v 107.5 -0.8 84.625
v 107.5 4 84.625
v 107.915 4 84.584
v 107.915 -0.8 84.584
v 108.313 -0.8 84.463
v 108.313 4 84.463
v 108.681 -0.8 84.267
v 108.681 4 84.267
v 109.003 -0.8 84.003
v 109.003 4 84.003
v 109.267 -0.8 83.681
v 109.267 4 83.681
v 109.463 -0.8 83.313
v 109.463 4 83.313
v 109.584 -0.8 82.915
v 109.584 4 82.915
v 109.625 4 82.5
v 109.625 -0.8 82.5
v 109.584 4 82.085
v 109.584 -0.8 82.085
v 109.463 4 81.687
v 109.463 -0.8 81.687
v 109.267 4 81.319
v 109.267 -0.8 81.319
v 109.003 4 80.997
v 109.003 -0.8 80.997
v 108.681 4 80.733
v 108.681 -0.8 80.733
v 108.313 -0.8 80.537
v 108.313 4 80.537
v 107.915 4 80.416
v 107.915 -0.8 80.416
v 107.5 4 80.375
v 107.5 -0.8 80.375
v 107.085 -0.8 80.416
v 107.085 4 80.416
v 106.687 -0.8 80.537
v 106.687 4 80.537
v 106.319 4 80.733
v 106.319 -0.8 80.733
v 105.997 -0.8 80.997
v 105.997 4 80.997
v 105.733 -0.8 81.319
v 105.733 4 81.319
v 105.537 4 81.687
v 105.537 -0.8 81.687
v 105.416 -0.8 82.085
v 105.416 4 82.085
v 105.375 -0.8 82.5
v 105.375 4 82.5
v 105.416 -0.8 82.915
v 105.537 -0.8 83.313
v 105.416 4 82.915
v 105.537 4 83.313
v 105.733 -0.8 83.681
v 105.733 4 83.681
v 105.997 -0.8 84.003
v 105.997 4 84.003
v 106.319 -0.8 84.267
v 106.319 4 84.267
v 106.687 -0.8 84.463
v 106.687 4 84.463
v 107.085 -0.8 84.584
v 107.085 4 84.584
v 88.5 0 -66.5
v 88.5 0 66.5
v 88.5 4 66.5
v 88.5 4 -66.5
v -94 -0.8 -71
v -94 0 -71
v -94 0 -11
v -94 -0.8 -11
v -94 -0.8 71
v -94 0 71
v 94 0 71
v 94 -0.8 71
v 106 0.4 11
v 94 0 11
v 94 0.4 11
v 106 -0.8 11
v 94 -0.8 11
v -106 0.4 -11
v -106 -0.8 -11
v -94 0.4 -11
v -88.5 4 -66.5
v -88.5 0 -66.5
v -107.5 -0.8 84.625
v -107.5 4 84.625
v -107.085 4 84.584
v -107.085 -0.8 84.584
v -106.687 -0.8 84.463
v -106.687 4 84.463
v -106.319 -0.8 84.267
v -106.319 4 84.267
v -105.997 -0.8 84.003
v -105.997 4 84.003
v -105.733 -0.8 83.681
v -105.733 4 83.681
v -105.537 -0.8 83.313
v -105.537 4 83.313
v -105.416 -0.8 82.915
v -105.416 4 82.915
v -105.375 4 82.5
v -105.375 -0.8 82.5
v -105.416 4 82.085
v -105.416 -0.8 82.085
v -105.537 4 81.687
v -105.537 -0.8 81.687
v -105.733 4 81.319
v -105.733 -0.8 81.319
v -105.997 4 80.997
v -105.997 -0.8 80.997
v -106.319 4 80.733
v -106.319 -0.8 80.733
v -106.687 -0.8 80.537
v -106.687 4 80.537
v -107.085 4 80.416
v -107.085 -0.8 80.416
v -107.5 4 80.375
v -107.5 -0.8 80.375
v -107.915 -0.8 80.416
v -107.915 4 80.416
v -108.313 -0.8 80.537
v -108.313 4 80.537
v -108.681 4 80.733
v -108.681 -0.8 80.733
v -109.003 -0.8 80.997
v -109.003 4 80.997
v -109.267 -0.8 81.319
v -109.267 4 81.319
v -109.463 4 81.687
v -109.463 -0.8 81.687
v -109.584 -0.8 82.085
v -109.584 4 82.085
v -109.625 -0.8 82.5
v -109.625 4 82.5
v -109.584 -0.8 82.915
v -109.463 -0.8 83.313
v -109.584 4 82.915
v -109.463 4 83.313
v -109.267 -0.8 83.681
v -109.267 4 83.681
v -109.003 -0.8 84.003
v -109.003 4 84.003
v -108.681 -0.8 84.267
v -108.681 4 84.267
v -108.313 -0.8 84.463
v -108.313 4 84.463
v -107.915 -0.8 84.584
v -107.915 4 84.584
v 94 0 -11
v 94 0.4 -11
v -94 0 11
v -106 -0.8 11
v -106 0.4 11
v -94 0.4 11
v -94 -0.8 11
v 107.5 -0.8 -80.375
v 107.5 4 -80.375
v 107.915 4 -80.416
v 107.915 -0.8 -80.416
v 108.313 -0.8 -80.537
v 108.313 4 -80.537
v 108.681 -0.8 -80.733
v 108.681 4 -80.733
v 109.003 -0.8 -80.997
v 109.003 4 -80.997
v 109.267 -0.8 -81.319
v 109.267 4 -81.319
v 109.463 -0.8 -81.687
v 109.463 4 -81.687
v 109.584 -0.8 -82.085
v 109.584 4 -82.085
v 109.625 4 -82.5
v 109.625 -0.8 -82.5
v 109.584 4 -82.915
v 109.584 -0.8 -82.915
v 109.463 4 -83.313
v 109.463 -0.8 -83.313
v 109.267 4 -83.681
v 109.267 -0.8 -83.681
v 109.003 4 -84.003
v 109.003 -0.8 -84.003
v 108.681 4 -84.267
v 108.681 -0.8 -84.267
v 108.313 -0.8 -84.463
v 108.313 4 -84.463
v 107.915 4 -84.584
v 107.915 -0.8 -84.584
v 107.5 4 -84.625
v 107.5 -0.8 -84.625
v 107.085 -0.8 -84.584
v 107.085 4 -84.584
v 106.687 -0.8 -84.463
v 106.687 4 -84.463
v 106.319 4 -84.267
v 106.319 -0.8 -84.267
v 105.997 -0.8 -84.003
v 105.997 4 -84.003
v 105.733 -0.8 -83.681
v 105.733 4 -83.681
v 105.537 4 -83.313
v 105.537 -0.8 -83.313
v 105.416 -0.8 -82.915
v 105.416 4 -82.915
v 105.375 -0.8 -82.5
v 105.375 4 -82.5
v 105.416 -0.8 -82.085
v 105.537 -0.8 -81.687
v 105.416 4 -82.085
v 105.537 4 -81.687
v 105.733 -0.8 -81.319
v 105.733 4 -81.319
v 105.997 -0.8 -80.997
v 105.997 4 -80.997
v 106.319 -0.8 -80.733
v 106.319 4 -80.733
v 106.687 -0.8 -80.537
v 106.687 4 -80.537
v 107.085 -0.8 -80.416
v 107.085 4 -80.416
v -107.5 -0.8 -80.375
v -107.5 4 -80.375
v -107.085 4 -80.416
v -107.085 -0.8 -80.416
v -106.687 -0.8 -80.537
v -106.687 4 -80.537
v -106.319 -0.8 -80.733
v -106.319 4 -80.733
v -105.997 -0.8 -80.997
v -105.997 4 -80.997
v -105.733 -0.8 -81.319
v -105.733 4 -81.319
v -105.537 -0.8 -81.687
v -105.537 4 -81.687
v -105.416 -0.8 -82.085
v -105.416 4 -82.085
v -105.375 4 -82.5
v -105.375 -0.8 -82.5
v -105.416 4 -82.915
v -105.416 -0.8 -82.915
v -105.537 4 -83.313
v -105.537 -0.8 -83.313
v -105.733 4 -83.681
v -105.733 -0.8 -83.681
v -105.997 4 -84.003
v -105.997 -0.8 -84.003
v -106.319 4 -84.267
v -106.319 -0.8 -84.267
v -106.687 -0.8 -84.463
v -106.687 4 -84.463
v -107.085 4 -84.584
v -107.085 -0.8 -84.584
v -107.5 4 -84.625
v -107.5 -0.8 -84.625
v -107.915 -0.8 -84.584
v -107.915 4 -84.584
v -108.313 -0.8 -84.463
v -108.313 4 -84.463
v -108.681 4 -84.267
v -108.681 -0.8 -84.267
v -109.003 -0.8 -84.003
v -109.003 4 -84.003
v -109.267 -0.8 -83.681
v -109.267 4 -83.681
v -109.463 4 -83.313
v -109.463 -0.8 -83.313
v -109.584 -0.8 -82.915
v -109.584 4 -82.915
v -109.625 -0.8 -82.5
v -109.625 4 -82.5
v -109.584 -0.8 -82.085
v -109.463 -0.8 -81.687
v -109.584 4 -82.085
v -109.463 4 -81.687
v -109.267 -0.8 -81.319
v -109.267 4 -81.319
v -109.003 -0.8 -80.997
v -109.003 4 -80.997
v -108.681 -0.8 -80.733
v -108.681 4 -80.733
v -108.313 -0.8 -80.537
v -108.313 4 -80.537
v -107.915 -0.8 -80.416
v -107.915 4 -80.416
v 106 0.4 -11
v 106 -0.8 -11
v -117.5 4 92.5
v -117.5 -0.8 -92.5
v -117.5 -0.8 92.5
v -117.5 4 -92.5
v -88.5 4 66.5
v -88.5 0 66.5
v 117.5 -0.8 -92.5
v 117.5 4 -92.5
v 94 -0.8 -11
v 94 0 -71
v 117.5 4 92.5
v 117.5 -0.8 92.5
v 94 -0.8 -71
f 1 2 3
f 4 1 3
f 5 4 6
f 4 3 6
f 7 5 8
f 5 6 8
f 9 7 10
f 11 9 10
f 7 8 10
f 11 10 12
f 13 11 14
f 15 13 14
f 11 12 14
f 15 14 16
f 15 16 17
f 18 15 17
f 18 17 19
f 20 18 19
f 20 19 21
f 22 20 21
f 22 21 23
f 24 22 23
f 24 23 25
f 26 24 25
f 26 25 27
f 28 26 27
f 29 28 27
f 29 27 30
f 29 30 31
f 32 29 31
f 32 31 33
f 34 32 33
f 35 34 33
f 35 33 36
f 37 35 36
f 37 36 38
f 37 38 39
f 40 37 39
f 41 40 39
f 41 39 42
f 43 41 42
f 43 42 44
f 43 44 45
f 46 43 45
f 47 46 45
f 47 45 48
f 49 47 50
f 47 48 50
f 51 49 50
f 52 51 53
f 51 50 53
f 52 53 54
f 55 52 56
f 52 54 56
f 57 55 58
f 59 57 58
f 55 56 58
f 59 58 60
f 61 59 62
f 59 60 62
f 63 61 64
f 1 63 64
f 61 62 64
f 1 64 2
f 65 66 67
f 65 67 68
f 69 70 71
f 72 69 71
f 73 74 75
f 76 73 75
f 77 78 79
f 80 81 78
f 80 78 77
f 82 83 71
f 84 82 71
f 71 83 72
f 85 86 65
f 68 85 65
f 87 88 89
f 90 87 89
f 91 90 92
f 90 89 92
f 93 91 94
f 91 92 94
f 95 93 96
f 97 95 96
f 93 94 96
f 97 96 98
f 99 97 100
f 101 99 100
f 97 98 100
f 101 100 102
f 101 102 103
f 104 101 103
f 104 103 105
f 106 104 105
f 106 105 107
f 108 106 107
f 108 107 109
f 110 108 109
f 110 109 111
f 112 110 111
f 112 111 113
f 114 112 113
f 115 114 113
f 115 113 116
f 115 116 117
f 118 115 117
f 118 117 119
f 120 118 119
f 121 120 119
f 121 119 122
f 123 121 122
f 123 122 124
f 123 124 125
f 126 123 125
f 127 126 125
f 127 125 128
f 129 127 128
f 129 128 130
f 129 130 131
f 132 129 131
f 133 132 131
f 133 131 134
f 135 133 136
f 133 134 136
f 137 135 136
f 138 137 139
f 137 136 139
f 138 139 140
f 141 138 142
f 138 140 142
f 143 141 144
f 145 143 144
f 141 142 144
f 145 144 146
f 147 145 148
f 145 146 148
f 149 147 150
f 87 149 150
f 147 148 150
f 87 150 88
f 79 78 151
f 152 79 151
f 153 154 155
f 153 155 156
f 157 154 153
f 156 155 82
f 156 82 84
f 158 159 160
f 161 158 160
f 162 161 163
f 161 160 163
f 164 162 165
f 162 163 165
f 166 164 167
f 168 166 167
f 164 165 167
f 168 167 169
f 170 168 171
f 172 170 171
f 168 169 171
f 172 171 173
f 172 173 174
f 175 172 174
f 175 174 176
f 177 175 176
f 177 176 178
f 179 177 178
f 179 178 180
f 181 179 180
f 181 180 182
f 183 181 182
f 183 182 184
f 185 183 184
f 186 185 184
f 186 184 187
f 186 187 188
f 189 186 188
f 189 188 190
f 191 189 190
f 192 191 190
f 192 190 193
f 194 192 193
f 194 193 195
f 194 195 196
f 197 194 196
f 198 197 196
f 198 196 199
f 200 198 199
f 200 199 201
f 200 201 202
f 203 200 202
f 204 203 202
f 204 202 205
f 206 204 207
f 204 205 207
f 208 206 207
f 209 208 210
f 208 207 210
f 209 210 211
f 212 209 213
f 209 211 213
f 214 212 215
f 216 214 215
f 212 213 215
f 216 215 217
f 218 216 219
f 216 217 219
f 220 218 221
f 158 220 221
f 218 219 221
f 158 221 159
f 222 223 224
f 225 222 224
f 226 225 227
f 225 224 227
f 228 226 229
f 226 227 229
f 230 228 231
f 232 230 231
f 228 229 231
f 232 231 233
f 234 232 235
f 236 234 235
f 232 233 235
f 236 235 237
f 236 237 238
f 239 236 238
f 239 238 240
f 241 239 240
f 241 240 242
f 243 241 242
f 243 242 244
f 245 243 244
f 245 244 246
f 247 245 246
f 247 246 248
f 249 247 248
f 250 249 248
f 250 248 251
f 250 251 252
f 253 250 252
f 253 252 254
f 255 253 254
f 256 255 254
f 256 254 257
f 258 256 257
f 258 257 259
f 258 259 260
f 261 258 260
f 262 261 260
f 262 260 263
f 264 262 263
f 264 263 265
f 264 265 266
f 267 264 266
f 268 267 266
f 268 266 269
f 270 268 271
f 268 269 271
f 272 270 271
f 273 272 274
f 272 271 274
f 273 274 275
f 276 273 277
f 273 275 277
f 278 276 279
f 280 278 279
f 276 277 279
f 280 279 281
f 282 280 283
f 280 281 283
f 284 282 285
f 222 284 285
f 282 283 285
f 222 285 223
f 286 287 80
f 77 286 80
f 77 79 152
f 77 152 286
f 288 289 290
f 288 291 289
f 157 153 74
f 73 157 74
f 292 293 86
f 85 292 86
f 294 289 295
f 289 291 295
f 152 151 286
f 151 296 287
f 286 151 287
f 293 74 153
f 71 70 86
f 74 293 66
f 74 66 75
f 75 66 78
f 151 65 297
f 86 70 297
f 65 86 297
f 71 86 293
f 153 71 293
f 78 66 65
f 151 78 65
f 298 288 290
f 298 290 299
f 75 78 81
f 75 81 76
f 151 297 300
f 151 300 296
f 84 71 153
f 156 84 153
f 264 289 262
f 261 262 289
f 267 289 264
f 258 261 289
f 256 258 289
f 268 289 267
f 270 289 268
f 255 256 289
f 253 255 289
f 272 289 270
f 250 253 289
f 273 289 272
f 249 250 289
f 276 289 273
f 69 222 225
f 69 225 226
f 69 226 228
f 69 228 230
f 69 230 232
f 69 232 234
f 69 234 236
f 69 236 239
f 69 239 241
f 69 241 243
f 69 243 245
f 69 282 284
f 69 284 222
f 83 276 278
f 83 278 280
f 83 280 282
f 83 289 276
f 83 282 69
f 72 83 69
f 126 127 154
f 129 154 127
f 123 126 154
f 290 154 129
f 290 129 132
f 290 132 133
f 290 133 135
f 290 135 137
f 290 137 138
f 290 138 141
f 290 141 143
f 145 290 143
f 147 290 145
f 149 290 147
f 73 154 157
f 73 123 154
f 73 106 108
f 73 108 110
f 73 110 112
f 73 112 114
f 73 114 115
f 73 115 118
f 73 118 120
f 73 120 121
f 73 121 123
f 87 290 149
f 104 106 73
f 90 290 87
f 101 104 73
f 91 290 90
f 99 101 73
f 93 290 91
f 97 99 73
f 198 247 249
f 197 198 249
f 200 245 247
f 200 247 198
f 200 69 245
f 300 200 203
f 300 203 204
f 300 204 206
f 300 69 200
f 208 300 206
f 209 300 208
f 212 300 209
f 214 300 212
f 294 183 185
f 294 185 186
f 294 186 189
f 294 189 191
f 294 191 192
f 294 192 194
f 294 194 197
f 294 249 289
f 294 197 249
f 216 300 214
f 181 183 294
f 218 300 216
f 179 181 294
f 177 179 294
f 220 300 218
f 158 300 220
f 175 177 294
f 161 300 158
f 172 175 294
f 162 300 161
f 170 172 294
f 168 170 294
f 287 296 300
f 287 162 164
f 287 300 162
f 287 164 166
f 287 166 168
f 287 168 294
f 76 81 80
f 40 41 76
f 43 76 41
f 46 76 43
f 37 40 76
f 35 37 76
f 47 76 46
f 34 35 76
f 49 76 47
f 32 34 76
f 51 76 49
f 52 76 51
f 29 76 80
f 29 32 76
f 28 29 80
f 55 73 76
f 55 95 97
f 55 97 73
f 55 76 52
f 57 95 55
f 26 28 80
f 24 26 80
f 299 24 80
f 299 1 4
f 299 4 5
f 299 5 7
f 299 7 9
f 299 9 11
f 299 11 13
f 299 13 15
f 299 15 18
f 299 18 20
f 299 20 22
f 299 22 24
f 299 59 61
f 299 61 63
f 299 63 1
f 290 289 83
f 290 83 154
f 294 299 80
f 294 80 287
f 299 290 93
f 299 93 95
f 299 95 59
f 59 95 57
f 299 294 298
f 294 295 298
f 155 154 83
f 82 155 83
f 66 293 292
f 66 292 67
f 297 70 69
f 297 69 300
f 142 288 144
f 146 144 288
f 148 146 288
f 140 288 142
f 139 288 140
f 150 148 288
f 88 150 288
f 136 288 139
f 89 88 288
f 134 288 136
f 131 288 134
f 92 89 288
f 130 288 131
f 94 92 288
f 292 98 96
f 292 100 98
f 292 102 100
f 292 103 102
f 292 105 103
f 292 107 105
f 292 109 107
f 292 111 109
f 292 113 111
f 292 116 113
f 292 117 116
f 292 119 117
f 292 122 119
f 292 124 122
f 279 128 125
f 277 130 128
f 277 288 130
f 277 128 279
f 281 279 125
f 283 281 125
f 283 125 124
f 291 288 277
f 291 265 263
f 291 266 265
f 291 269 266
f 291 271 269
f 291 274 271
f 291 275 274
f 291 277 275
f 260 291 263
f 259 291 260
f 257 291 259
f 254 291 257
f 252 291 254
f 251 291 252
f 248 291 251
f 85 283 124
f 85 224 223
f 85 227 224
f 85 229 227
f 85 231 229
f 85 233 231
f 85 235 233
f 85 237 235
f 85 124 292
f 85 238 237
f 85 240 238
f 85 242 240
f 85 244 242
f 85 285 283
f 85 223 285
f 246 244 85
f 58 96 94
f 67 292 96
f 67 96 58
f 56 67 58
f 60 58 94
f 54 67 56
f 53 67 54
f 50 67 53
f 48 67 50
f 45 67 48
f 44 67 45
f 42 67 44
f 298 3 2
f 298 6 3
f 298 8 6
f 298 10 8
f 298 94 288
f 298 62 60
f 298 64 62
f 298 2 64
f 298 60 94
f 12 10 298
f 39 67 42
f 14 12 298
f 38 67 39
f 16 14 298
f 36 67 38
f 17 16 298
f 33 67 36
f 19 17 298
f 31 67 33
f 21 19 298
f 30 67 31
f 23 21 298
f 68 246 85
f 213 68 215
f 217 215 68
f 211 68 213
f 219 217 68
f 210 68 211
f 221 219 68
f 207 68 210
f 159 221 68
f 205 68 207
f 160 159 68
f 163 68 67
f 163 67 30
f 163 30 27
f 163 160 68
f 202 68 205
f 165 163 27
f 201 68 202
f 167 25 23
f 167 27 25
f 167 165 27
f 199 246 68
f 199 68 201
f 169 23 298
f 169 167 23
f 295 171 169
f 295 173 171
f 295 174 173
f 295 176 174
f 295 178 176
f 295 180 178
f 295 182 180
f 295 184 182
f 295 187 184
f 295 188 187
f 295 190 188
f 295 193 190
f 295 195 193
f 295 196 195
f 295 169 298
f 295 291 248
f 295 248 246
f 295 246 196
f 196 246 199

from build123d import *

# Parameters (mm, degrees)
CROQUIS1_W              = 235
CROQUIS1_H              = 185
CROQUIS1_W_2            = 177
CROQUIS1_H_2            = 133
SALIENTE_EXTRUIR1_DEPTH = 4
CROQUIS2_W              = 235
CROQUIS2_H              = 185
CROQUIS2_W_2            = 188
CROQUIS2_H_2            = 142
SALIENTE_EXTRUIR2_DEPTH = 0.8
CROQUIS3_R              = 2.125
CORTAR_EXTRUIR1_DEPTH   = 5
CROQUIS4_W              = 12
CROQUIS4_H              = 11
CORTAR_EXTRUIR2_DEPTH   = 1.2


with BuildPart() as part:
    # Croquis1 → Saliente-Extruir1 (new body)
    with BuildSketch(Plane(origin=(0, 0, 0), x_dir=(1, 0, 0), z_dir=(0, 1, 0))):
        Rectangle(CROQUIS1_W, CROQUIS1_H)
        Rectangle(CROQUIS1_W_2, CROQUIS1_H_2, mode=Mode.SUBTRACT)
    extrude(amount=SALIENTE_EXTRUIR1_DEPTH)

    # Croquis2 → Saliente-Extruir2 (add)
    with BuildSketch(Plane.XZ):
        Rectangle(CROQUIS2_W, CROQUIS2_H)
        Rectangle(CROQUIS2_W_2, CROQUIS2_H_2, mode=Mode.SUBTRACT)
    extrude(amount=SALIENTE_EXTRUIR2_DEPTH)

    # Croquis3 → Cortar-Extruir1 (cut)
    with BuildSketch(Plane(origin=(0, 4, 0), x_dir=(1, 0, 0), z_dir=(0, 1, 0))):
        with Locations(Location((-107.5, 82.5, 0), (0, 0, 270))):
            Circle(CROQUIS3_R)
        with Locations(Location((-107.5, -82.5, 0), (0, 0, 270))):
            Circle(CROQUIS3_R)
        with Locations(Location((107.5, 82.5, 0), (0, 0, 270))):
            Circle(CROQUIS3_R)
        with Locations(Location((107.5, -82.5, 0), (0, 0, 270))):
            Circle(CROQUIS3_R)
    extrude(amount=-CORTAR_EXTRUIR1_DEPTH, mode=Mode.SUBTRACT)

    # Croquis4 → Cortar-Extruir2 (cut)
    with BuildSketch(Plane.XZ.offset(0.8)):
        with Locations((-100, 5.5)):
            Rectangle(CROQUIS4_W, CROQUIS4_H)
        with Locations((-100, -5.5)):
            Rectangle(CROQUIS4_W, CROQUIS4_H)
        with Locations((100, 5.5)):
            Rectangle(CROQUIS4_W, CROQUIS4_H)
        with Locations((100, -5.5)):
            Rectangle(CROQUIS4_W, CROQUIS4_H)
    extrude(amount=-CORTAR_EXTRUIR2_DEPTH, mode=Mode.SUBTRACT)


solid = part.part
